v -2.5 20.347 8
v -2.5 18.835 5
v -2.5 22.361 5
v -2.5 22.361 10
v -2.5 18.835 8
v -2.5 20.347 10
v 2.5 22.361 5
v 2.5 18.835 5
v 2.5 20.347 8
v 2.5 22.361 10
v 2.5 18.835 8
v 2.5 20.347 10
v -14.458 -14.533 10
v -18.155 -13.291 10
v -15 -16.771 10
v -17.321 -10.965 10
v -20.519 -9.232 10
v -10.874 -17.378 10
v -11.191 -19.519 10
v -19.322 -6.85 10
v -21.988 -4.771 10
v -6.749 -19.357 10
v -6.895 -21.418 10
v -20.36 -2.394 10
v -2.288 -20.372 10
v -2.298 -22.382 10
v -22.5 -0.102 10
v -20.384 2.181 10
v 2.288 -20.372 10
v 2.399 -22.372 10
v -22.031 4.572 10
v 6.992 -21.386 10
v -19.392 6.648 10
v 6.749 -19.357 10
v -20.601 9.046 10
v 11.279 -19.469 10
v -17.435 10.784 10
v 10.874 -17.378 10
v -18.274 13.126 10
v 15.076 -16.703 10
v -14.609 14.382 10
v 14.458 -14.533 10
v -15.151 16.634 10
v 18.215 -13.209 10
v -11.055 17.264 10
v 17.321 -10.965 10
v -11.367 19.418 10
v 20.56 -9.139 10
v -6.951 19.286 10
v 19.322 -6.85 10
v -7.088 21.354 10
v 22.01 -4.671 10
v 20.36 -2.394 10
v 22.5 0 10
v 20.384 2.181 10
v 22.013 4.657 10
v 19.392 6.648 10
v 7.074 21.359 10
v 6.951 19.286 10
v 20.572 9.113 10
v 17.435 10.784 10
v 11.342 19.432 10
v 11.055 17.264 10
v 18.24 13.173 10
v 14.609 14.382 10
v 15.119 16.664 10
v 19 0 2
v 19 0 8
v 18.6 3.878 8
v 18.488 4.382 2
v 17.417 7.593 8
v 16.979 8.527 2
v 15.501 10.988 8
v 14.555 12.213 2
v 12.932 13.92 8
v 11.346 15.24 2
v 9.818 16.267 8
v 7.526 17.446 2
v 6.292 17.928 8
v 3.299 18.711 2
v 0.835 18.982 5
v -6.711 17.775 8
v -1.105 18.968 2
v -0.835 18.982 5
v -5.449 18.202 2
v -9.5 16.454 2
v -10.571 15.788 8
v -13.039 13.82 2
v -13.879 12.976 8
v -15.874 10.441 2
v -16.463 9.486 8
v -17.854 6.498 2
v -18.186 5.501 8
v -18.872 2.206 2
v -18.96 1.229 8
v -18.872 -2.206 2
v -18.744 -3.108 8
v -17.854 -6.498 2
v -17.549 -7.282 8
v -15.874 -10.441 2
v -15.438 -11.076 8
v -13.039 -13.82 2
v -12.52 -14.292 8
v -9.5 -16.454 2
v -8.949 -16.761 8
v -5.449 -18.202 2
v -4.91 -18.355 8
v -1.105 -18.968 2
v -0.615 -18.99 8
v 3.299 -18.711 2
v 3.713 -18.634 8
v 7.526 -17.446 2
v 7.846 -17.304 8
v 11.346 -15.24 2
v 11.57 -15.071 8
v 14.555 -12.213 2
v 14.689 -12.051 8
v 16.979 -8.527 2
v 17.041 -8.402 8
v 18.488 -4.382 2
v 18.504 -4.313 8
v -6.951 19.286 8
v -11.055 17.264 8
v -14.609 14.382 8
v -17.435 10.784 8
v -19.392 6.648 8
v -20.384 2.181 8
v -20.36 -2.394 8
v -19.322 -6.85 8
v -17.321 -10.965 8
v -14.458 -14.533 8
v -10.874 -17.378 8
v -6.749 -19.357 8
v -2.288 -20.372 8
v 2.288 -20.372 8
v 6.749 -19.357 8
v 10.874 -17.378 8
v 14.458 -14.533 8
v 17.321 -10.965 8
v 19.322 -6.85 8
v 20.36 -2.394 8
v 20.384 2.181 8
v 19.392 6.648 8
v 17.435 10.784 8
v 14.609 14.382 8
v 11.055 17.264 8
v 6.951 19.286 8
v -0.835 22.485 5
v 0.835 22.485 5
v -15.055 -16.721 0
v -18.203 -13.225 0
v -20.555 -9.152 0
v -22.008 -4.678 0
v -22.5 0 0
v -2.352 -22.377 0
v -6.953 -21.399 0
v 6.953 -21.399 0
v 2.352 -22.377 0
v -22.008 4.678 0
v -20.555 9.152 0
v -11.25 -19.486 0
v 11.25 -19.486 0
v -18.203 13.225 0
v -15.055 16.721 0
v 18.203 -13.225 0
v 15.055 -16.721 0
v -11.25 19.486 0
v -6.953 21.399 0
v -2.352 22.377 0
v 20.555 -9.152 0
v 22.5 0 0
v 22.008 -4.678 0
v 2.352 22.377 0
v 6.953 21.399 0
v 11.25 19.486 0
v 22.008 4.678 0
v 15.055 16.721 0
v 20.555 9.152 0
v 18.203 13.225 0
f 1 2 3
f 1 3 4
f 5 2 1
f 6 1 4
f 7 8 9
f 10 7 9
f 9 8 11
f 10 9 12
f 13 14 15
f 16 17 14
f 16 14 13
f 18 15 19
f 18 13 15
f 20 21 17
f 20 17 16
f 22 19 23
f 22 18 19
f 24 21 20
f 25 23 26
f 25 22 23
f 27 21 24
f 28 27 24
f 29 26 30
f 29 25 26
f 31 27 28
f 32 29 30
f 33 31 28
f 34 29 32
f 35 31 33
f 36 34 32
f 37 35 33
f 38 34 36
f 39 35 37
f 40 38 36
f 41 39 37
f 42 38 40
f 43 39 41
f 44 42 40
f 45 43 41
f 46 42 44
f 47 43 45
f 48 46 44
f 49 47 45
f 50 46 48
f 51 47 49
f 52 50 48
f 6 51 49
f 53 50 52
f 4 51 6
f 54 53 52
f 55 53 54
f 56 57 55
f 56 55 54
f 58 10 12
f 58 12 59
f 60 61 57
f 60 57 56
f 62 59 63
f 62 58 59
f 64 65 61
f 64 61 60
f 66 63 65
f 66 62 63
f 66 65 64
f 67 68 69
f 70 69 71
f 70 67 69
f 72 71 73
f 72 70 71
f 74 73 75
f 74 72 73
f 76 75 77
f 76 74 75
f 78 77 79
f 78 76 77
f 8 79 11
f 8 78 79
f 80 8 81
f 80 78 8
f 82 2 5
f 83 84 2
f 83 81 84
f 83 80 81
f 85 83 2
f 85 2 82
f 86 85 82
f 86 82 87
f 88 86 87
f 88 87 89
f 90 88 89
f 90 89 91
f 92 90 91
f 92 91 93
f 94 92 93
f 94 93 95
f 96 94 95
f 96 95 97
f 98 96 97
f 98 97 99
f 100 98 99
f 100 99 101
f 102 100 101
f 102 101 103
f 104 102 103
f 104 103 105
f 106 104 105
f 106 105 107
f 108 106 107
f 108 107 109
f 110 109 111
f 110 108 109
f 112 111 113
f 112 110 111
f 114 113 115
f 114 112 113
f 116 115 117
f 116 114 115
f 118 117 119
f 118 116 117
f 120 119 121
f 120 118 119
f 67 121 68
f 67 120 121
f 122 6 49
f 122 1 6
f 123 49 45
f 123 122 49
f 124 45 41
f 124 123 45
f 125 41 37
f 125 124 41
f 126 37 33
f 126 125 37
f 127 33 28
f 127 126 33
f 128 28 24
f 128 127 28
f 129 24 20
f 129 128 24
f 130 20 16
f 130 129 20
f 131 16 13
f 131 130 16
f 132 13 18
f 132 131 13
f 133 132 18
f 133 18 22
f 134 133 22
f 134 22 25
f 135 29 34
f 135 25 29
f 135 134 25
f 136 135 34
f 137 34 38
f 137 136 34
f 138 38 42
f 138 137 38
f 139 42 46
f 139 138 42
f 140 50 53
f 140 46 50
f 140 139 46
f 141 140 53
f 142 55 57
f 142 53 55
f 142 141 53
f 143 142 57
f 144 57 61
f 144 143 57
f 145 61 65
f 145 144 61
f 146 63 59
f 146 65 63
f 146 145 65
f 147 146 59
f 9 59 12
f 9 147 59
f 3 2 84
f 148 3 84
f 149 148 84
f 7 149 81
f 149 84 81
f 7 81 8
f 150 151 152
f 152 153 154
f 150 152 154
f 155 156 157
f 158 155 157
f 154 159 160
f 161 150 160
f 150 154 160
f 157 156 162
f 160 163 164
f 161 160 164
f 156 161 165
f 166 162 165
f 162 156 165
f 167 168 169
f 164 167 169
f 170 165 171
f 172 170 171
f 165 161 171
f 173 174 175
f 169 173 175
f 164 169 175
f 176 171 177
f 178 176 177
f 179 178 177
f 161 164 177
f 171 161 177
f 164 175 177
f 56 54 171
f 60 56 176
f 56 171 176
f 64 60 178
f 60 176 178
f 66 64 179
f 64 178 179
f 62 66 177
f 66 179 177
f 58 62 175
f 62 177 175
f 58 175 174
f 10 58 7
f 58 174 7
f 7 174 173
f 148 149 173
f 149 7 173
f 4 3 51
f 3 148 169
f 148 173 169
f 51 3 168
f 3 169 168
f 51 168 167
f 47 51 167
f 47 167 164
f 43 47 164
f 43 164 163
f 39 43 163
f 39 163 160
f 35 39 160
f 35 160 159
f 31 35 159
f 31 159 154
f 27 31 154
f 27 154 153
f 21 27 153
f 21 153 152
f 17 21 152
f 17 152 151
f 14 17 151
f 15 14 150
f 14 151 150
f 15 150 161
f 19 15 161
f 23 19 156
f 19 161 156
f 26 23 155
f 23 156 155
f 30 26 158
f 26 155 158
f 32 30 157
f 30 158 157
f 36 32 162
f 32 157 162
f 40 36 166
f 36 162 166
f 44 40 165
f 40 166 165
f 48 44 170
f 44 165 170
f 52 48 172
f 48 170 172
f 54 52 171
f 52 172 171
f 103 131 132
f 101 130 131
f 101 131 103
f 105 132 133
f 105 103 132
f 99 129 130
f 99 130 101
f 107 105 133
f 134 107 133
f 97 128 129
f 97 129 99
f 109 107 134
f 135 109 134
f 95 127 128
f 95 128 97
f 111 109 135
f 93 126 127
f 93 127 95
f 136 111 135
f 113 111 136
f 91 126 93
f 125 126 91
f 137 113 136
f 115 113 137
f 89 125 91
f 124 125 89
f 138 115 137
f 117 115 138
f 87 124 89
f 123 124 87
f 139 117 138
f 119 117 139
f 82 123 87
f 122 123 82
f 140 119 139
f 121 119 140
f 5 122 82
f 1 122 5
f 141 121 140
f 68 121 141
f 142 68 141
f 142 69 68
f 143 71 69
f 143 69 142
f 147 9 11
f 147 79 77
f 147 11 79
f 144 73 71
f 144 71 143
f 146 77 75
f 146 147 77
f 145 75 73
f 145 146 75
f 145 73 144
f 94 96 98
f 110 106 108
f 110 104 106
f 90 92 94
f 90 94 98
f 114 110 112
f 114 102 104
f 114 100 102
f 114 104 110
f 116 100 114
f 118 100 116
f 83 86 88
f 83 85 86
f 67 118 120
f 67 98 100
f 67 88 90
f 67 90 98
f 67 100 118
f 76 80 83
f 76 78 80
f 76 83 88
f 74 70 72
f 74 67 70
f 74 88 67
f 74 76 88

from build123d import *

# Parameters (mm, degrees)
SKETCH_R      = 22.5
PAD_DEPTH     = 2
SKETCH001_R   = 22.5
SKETCH001_R_2 = 20.5
PAD001_DEPTH  = 10
SKETCH002_R   = 22.5
SKETCH002_R_2 = 19
PAD002_DEPTH  = 8
SKETCH003_W   = 5
SKETCH003_H   = 20
POCKET_DEPTH  = 22.501


with BuildPart() as part:
    # Sketch → Pad (new body)
    with BuildSketch(Plane.XY):
        Circle(SKETCH_R)
    extrude(amount=PAD_DEPTH)

    # Sketch001 → Pad001 (join)
    with BuildSketch(Plane.XY):
        Circle(SKETCH001_R)
        Circle(SKETCH001_R_2, mode=Mode.SUBTRACT)
    extrude(amount=PAD001_DEPTH)

    # Sketch002 → Pad002 (join)
    with BuildSketch(Plane.XY):
        Circle(SKETCH002_R)
        Circle(SKETCH002_R_2, mode=Mode.SUBTRACT)
    extrude(amount=PAD002_DEPTH)

    # Sketch003 → Pocket (cut, through all)
    with BuildSketch(Plane.XZ):
        with Locations((0, 15)):
            Rectangle(SKETCH003_W, SKETCH003_H)
    extrude(amount=-POCKET_DEPTH, mode=Mode.SUBTRACT)


solid = part.part
